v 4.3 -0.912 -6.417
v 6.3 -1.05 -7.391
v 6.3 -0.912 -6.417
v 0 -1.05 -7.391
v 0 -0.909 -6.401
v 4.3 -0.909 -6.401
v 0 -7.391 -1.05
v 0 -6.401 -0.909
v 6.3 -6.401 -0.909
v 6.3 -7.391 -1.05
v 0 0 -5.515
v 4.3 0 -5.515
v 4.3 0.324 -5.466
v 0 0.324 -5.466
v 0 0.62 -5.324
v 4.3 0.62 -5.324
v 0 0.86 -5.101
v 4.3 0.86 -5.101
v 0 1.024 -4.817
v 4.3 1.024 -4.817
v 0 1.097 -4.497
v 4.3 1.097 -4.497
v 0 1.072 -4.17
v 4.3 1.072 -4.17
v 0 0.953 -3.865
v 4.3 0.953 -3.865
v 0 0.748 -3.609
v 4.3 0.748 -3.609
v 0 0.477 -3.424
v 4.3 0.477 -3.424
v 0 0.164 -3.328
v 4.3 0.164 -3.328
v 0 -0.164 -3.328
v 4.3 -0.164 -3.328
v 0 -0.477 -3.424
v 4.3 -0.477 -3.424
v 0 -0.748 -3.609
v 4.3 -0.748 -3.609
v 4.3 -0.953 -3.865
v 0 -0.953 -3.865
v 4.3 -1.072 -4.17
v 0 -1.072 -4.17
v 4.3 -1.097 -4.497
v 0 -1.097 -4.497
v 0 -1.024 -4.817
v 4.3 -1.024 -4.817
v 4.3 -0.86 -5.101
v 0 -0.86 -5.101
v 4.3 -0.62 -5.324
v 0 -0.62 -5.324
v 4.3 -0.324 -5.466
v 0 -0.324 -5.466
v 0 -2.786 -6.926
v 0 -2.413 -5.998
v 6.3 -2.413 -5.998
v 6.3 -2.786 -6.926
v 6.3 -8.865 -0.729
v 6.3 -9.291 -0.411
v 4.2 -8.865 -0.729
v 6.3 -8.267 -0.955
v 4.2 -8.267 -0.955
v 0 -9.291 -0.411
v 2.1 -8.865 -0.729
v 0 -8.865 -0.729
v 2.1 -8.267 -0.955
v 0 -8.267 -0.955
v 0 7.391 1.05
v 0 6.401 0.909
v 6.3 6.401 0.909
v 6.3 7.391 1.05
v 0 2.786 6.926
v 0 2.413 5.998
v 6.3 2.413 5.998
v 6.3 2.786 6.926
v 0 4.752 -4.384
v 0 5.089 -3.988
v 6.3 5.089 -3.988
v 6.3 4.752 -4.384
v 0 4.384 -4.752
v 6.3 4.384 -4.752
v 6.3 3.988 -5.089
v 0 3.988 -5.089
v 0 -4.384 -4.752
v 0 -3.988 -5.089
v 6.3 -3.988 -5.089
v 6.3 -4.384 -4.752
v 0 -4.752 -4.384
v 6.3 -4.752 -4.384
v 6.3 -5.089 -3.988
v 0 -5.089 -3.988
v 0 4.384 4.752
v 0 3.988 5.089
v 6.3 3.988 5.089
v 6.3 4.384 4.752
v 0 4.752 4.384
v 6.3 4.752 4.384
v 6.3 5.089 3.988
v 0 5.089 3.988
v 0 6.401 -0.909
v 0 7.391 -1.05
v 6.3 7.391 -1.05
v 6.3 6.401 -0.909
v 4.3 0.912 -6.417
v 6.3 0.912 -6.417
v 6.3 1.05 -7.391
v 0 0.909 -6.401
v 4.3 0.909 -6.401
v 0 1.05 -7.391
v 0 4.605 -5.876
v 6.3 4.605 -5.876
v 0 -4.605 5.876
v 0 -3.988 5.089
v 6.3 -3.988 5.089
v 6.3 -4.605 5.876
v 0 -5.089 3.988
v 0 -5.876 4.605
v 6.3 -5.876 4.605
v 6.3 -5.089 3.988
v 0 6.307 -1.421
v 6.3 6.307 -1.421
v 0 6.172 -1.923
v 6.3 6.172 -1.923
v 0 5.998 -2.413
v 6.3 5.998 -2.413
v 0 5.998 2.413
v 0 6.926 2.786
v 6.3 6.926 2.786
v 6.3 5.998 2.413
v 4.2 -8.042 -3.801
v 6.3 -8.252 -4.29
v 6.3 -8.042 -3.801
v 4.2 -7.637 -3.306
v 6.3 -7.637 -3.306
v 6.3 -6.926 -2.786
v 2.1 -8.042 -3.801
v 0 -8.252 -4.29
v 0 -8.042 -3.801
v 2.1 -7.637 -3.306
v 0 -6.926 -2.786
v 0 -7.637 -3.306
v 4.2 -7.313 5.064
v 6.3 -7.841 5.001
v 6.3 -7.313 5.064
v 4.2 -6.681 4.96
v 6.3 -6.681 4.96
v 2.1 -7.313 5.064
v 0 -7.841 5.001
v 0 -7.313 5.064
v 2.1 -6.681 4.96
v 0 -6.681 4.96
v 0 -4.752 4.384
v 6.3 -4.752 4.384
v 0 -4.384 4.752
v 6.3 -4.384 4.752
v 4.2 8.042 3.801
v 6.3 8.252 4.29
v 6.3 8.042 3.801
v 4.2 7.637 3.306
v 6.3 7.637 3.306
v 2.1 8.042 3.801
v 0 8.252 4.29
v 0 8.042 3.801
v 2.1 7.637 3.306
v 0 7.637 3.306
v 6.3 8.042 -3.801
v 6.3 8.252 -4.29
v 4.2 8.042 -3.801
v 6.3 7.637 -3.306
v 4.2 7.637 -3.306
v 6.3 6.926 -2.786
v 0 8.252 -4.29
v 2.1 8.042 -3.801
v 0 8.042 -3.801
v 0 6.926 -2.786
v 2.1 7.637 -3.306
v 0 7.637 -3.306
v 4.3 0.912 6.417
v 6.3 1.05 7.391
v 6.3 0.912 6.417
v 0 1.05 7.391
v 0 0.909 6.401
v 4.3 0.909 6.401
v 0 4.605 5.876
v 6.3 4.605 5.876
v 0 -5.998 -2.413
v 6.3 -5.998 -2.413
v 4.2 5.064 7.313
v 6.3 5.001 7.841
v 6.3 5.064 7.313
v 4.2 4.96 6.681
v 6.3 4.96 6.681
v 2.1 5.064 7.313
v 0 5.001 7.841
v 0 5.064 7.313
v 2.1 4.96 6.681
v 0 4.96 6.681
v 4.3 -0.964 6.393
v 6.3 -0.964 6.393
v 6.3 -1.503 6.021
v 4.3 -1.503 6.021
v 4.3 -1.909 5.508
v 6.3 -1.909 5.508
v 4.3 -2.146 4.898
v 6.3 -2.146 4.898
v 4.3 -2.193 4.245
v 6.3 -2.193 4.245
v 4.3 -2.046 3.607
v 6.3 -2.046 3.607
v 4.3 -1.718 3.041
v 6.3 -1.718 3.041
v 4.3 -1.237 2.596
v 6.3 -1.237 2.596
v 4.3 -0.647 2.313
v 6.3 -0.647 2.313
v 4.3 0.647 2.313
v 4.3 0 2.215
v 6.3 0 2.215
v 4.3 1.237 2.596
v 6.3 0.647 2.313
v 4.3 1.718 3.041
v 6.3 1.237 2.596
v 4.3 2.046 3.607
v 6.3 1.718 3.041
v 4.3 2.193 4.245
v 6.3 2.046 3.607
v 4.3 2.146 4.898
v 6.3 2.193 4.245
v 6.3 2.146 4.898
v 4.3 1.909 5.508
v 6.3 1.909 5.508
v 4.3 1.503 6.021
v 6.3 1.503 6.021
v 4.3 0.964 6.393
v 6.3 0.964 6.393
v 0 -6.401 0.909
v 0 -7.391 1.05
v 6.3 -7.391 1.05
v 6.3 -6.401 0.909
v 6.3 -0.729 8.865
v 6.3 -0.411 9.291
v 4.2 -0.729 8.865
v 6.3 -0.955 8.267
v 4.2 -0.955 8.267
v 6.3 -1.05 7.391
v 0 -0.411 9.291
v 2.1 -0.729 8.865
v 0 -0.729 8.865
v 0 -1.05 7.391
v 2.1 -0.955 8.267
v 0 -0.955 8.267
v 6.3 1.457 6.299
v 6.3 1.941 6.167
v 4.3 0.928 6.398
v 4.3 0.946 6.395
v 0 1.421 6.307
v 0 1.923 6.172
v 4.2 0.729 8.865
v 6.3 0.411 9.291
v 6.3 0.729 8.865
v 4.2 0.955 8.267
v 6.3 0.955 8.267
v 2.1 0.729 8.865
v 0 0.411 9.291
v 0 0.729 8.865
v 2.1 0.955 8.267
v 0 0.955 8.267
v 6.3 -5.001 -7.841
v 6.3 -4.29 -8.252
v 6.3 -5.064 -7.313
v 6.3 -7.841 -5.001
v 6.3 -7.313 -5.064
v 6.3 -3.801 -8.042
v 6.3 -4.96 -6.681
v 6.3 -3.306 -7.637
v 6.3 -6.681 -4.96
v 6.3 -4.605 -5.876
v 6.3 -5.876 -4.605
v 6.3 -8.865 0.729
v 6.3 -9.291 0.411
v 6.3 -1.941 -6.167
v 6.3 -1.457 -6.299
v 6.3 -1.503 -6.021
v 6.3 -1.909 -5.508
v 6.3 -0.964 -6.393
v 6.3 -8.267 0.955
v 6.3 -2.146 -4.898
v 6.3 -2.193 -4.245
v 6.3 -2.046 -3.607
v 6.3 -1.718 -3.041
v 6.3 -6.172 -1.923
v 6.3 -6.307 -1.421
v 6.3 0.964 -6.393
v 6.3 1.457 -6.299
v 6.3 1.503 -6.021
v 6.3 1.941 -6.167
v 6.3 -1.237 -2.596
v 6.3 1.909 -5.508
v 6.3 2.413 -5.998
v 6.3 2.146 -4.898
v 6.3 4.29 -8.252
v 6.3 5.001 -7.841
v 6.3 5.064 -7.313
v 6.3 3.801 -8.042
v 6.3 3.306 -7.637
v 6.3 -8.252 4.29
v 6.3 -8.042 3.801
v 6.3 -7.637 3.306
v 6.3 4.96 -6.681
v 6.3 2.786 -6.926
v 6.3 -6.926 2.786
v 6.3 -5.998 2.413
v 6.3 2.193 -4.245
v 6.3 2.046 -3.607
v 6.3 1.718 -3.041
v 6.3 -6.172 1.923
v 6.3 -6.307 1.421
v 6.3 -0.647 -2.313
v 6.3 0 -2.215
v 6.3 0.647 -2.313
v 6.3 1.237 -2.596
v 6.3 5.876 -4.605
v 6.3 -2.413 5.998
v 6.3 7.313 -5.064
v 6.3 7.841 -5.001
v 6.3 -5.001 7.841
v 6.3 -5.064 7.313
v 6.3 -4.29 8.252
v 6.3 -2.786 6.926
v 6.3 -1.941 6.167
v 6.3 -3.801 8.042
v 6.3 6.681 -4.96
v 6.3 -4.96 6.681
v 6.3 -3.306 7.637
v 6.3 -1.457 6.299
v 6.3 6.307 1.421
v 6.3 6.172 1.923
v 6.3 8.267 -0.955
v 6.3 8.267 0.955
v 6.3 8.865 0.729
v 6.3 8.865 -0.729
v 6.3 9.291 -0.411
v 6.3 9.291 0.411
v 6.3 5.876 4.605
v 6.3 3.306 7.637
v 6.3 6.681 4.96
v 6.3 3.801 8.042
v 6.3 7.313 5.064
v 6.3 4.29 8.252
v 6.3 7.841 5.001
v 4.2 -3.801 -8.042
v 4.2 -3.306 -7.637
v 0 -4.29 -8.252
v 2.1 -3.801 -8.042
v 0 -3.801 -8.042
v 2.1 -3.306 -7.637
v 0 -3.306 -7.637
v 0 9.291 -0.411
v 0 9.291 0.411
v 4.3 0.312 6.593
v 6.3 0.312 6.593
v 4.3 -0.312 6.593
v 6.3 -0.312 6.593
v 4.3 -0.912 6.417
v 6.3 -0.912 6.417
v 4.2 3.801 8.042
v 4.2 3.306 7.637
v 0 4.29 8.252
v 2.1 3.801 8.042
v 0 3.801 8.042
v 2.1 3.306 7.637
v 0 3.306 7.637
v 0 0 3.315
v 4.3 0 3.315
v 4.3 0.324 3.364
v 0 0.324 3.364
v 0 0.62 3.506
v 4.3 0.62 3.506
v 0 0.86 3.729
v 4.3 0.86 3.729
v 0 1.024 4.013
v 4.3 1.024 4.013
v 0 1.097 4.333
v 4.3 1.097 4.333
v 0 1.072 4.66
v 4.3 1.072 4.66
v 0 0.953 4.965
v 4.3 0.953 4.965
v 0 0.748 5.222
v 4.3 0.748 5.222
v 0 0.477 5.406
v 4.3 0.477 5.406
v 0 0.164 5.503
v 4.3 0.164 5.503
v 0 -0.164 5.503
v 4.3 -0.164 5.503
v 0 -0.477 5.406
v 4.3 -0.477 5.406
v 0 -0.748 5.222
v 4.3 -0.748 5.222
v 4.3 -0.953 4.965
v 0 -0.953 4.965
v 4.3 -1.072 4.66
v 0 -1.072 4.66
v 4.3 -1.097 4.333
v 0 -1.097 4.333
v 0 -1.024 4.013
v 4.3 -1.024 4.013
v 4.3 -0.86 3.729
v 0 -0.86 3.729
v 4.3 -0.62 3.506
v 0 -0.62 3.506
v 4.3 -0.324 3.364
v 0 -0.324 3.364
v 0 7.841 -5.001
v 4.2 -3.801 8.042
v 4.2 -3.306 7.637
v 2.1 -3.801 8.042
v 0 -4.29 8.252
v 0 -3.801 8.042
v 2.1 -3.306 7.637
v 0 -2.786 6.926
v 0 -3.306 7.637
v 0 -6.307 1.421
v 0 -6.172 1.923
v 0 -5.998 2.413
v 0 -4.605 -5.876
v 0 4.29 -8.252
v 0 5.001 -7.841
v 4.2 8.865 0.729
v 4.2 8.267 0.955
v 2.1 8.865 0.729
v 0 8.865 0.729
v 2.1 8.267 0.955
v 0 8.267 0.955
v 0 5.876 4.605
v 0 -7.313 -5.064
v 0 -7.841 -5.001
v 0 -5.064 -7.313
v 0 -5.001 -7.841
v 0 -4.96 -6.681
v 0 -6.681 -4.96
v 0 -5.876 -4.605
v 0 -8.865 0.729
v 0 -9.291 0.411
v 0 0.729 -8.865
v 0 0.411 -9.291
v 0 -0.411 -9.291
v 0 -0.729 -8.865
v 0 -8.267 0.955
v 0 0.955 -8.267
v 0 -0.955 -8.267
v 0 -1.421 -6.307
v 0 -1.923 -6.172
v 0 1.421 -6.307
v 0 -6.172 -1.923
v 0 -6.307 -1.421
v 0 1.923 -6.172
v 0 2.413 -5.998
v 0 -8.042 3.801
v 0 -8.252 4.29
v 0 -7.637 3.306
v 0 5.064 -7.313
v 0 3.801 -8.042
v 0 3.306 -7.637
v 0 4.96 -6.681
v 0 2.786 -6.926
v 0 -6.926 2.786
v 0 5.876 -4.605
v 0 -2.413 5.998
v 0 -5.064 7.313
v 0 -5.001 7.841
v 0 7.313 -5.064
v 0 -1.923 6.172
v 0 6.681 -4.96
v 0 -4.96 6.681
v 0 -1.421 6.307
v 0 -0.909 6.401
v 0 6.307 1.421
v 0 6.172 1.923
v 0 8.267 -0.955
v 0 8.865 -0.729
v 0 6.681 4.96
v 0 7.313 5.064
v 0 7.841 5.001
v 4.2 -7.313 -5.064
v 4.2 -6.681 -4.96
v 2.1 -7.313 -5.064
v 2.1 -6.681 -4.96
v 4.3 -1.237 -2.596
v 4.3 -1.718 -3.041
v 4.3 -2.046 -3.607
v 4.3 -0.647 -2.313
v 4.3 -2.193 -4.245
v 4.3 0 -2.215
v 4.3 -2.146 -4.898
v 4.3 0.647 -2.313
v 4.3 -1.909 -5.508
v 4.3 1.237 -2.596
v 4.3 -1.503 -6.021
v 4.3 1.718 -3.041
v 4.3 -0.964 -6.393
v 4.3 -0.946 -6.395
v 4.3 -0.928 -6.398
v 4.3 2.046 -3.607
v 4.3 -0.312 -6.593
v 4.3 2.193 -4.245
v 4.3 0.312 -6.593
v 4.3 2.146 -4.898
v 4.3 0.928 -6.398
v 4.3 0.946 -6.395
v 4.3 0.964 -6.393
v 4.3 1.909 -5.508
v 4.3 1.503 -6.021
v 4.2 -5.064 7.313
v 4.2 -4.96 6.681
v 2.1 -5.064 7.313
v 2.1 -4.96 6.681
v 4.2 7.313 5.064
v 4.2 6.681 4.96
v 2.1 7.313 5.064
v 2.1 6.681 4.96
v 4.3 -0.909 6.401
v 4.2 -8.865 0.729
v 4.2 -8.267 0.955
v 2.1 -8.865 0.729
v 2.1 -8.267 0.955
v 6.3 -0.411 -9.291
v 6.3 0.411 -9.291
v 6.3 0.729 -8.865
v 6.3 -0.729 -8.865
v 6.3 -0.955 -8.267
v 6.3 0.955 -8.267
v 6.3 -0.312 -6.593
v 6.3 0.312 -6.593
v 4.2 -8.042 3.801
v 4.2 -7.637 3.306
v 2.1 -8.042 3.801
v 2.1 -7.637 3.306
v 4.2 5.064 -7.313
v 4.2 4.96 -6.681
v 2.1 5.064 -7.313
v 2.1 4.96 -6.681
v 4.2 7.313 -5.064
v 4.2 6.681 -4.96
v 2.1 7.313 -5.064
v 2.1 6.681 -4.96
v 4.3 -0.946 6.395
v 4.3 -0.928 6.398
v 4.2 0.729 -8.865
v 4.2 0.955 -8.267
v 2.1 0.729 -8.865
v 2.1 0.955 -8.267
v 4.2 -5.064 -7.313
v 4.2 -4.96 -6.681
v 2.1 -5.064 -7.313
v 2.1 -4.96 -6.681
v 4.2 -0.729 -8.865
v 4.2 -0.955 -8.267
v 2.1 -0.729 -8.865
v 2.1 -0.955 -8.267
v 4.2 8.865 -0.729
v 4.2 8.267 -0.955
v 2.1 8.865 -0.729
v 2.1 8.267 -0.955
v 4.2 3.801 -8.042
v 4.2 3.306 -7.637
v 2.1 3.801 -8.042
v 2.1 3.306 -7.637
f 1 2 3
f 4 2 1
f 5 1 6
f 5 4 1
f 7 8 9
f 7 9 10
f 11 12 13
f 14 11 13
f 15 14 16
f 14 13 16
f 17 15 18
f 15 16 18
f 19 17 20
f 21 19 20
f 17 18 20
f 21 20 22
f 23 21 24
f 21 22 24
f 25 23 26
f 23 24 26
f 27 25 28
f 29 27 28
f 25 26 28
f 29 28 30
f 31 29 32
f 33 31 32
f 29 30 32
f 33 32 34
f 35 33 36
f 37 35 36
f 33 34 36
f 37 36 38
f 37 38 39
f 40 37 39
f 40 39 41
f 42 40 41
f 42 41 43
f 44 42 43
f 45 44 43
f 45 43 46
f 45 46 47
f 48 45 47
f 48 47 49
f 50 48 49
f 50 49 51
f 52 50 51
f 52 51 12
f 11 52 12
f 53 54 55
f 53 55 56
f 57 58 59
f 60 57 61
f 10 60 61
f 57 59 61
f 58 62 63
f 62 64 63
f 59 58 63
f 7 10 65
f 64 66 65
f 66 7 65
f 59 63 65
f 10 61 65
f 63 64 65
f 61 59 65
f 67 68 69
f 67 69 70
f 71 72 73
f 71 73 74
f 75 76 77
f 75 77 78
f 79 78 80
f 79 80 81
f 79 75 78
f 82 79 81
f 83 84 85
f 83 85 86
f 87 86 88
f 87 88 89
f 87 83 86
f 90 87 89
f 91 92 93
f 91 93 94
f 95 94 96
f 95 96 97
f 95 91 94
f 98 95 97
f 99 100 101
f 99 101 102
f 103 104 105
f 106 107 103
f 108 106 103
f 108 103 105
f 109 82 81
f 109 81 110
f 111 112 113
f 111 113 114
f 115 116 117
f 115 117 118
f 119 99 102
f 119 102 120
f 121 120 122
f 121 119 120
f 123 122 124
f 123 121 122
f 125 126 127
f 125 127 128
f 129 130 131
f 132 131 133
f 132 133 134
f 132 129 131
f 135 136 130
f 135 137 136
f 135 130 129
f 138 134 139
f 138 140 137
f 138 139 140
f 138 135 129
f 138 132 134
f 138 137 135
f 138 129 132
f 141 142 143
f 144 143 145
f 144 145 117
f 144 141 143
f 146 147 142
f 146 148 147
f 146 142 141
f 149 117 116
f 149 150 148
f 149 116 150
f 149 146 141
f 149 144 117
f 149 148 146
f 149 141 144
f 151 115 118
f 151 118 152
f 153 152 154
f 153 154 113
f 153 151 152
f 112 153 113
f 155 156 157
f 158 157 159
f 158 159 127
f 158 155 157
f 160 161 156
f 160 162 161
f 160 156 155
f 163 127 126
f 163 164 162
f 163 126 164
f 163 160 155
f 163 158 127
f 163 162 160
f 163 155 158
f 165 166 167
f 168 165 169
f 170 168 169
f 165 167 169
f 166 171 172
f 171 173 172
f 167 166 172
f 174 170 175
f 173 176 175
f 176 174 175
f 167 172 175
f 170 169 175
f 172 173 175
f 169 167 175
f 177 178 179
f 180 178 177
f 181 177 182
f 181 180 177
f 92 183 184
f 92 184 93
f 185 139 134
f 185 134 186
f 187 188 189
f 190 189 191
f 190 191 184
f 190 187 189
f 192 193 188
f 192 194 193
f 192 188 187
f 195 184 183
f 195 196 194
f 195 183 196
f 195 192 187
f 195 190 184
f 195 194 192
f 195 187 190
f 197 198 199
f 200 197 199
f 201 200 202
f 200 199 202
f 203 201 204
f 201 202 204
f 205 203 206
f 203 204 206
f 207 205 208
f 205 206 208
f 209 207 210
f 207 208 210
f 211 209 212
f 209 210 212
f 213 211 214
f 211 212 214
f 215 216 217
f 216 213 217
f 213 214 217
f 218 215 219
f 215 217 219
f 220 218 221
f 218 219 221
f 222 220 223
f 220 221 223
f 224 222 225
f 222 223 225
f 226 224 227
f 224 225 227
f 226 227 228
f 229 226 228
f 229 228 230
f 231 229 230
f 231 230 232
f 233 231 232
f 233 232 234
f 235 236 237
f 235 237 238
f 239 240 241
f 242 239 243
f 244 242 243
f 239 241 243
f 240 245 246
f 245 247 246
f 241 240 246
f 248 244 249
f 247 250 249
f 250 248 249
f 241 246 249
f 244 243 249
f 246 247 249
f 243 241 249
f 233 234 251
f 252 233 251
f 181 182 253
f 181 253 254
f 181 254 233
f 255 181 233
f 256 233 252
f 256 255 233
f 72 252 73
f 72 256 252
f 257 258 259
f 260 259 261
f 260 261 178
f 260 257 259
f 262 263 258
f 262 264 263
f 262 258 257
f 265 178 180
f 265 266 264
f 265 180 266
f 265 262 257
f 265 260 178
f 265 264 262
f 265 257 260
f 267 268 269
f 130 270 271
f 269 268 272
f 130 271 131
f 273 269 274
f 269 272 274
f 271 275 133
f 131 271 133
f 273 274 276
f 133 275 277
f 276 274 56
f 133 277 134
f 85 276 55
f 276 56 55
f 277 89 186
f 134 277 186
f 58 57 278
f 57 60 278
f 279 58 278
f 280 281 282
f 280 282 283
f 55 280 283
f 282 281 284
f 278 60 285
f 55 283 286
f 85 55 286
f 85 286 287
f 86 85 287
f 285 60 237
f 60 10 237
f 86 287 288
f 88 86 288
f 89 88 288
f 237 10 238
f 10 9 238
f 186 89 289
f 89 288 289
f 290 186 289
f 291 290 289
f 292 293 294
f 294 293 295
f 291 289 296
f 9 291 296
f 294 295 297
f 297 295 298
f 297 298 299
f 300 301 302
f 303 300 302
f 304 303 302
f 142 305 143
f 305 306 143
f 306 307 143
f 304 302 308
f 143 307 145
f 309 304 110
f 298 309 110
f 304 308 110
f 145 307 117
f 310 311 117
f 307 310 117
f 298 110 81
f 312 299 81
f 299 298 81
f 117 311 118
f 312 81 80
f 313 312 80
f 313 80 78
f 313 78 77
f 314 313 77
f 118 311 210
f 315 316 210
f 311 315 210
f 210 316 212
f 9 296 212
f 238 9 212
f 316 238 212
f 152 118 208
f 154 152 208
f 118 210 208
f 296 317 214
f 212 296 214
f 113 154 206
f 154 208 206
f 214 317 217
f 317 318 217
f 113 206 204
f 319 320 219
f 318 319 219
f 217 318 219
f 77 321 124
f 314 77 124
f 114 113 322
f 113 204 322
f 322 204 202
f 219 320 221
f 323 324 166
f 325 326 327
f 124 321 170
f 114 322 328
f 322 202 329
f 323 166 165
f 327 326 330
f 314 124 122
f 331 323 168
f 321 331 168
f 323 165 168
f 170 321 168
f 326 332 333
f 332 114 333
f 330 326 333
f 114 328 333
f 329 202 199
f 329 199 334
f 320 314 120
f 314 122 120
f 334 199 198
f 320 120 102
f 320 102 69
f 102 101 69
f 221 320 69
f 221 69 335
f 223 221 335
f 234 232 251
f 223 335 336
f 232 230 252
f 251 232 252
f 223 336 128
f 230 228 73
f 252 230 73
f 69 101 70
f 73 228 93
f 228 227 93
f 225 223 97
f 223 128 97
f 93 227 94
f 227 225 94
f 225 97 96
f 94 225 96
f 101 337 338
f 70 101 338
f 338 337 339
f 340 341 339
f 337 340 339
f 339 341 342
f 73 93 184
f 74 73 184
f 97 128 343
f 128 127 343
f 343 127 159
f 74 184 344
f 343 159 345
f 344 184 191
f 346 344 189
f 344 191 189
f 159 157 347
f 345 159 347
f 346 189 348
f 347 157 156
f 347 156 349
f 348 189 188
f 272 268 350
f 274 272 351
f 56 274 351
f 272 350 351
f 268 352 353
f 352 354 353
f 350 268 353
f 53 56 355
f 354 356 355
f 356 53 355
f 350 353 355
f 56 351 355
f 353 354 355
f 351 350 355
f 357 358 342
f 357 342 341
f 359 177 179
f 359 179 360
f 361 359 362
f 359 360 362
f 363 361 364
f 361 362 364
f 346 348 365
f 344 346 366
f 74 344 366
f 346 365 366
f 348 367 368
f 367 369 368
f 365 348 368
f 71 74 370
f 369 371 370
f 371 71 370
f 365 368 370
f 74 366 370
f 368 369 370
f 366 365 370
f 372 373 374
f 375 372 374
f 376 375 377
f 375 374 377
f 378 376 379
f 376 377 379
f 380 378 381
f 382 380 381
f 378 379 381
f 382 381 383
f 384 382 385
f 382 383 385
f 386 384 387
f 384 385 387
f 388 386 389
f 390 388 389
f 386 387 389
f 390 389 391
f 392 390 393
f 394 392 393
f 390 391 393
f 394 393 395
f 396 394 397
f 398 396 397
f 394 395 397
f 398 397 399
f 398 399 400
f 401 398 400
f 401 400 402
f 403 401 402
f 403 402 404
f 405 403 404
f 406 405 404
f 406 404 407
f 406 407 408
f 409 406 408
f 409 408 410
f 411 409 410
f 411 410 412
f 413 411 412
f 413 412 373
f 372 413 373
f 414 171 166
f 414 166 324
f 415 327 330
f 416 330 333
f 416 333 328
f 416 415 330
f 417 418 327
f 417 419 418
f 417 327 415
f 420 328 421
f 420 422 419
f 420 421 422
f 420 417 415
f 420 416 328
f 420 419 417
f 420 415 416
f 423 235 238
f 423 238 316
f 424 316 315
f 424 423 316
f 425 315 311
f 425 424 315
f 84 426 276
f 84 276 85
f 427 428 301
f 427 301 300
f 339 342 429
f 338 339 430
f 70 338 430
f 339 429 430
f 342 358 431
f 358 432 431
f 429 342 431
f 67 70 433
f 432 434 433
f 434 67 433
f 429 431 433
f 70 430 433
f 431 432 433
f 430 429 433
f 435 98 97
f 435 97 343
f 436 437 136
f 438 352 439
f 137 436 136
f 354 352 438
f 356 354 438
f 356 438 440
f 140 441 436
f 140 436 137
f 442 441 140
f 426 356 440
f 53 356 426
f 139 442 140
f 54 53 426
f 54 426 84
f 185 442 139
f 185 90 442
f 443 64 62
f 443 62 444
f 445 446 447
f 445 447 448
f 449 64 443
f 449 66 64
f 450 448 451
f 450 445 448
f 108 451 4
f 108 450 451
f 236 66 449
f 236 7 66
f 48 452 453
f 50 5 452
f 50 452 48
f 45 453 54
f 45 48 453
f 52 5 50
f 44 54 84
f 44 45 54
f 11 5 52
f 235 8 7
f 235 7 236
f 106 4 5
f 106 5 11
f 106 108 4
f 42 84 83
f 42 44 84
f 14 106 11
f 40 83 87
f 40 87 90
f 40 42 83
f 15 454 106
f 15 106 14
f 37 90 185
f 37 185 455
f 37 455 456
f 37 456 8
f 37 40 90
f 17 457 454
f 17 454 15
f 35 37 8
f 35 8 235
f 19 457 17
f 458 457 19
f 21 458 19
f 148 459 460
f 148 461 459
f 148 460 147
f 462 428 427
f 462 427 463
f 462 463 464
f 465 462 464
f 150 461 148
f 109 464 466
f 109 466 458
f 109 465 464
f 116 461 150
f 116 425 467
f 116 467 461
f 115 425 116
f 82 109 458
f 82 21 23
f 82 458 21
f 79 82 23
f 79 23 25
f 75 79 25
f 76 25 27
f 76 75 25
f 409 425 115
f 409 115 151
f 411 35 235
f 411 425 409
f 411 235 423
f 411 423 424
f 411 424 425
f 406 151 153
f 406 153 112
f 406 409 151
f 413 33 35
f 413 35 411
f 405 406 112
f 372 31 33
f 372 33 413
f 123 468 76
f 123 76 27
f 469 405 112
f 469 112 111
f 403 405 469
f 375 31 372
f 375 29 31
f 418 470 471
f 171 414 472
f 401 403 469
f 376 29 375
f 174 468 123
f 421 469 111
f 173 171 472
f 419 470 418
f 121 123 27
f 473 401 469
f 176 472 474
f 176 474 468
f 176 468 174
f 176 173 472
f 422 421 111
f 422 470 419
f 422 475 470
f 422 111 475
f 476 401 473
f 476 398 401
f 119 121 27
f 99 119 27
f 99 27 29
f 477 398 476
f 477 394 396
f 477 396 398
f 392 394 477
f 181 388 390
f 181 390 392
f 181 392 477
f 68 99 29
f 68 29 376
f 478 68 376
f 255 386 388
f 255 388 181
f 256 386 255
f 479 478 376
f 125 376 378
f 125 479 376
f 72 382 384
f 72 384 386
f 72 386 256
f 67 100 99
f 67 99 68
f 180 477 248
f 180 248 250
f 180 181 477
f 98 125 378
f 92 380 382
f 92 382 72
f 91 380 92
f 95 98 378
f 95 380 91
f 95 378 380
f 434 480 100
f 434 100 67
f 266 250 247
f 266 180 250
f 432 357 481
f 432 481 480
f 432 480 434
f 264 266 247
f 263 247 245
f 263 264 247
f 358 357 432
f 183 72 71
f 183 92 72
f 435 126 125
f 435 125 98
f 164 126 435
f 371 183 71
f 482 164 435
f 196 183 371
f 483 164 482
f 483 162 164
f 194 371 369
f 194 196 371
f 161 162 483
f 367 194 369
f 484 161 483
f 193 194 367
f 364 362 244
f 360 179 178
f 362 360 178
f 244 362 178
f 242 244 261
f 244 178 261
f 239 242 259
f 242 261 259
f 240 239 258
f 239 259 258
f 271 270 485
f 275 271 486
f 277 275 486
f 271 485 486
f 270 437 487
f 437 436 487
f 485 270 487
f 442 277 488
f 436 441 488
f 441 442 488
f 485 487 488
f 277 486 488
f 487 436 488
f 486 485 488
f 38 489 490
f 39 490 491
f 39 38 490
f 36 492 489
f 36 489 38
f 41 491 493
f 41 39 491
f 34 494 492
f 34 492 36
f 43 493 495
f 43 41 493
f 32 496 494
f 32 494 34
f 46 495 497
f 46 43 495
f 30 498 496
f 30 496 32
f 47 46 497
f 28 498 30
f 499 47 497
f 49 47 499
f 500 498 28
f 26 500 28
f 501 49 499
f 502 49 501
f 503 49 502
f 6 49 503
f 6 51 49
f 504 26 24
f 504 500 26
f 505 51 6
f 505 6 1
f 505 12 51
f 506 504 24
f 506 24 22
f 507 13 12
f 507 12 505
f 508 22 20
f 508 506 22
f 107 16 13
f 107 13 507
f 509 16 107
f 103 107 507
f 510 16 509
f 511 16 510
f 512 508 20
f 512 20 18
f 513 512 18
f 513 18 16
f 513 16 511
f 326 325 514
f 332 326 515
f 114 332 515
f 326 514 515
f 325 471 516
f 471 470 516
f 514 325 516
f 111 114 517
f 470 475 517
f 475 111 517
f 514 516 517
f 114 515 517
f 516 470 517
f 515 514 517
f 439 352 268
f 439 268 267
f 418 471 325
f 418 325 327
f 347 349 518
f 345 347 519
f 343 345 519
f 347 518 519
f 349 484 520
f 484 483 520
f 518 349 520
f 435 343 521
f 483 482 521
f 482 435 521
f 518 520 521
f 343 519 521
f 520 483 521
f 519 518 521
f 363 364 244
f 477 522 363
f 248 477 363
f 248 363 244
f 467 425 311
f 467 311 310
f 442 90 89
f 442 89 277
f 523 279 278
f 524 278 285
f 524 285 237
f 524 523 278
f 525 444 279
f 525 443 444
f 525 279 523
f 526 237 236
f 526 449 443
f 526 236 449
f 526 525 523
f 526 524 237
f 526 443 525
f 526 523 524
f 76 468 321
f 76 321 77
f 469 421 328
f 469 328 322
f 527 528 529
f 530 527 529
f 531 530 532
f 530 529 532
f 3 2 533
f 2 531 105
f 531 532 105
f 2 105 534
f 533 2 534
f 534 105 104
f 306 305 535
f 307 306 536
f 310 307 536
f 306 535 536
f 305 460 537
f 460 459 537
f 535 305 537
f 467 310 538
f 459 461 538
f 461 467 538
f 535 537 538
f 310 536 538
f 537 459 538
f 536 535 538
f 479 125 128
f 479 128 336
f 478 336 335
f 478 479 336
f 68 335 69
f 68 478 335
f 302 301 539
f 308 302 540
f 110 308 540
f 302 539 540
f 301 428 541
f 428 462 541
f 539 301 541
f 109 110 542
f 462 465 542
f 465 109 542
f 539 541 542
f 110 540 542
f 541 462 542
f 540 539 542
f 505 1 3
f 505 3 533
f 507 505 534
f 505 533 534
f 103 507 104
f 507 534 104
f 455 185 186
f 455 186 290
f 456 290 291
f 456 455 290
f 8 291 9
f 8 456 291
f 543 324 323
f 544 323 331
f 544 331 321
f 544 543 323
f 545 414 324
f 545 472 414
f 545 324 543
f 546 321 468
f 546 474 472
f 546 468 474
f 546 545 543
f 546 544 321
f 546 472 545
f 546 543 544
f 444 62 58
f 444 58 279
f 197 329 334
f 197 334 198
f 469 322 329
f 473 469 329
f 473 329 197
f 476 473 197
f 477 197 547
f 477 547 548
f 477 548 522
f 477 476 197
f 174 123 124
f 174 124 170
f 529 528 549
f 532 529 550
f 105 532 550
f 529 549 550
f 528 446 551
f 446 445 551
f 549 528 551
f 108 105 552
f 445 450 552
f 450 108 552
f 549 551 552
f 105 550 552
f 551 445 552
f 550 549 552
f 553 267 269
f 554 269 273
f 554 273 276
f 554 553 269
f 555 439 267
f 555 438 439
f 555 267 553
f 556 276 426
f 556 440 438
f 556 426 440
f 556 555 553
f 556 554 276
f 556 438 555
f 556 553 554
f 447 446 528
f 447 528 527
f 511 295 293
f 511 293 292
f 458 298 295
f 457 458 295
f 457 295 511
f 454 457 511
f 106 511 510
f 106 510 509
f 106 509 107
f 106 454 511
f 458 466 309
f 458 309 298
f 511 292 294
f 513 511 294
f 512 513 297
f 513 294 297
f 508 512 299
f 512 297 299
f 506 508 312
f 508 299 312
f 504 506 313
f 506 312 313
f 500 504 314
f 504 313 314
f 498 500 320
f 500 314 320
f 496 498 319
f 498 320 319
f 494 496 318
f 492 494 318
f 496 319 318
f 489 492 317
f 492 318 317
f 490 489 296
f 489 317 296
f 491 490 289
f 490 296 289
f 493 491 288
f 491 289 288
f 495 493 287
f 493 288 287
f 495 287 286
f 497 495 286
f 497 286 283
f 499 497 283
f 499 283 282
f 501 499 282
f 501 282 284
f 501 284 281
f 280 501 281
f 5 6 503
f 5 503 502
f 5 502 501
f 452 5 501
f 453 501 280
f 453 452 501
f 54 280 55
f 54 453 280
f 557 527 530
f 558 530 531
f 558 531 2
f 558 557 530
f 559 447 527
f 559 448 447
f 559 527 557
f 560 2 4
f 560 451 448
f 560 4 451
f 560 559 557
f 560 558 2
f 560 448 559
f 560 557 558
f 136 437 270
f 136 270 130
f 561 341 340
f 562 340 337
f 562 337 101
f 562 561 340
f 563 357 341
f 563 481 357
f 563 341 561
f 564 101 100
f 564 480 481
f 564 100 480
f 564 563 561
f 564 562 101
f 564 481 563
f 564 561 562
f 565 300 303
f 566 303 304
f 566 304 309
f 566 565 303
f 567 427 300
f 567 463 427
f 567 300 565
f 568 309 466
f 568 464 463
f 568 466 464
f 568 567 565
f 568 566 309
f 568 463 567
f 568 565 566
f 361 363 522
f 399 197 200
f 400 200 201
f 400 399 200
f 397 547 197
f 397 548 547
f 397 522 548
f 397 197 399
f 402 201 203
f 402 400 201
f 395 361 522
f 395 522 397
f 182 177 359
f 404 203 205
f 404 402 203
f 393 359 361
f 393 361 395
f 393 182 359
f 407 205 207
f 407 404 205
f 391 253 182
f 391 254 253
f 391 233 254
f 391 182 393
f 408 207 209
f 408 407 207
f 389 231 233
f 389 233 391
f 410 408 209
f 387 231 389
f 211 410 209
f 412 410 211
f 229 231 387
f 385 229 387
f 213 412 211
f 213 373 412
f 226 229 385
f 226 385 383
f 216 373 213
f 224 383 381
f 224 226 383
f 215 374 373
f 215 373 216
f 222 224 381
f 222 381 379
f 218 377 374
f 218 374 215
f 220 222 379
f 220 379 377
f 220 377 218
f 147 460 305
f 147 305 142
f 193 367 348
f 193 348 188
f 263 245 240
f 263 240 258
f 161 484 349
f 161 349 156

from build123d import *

# Parameters (mm, degrees)
BOSS_EXTRUDE1_DEPTH = 6.3
SKETCH2_R           = 1.1
CUT_EXTRUDE1_DEPTH  = 7.3000001
SKETCH3_R           = 2.2
CUT_EXTRUDE2_DEPTH  = 2


with BuildPart() as part:
    # Sketch1 → Boss-Extrude1 (new body)
    with BuildSketch(Plane(origin=(0, 0, 0), x_dir=(0, 0, -1), z_dir=(1, 0, 0))):
        with BuildLine():
            Line((-0.909343603, 6.400728022), (-1.05, 7.390786494))
            add(Edge.make_bspline(
                [(-0.410905417, 9.290786494), (-0.761226832, 8.915917898), (-1.03420339, 8.440297341), (-1.05, 7.390786494)],
                knots=[0, 0, 0, 0, 1, 1, 1, 1], degree=3))
            Line((-0.410905417, 9.290786494), (0.410905417, 9.290786494))
            add(Edge.make_bspline(
                [(0.410905417, 9.290786494), (0.761226832, 8.915917898), (1.03420339, 8.440297341), (1.05, 7.390786494)],
                knots=[0, 0, 0, 0, 1, 1, 1, 1], degree=3))
            Line((1.05, 7.390786494), (0.909343603, 6.400728022))
            ThreePointArc((0.909343603, 6.400728022), (1.673265127, 6.244710467), (2.41284935, 5.997864871))
            Line((2.41284935, 5.997864871), (2.786066573, 6.925608858))
            add(Edge.make_bspline(
                [(4.289538717, 8.251509833), (3.798717175, 8.102024814), (3.324502262, 7.826613608), (2.786066573, 6.925608858)],
                knots=[0, 0, 0, 0, 1, 1, 1, 1], degree=3))
            Line((4.289538717, 8.251509833), (5.001247777, 7.840604417))
            add(Edge.make_bspline(
                [(5.001247777, 7.840604417), (5.117200723, 7.340797982), (5.115795079, 6.792410217), (4.604719921, 5.875608858)],
                knots=[0, 0, 0, 0, 1, 1, 1, 1], degree=3))
            Line((4.604719921, 5.875608858), (3.987878672, 5.088521268))
            ThreePointArc((3.987878672, 5.088521268), (4.57144534, 4.57144534), (5.088521268, 3.987878672))
            Line((5.088521268, 3.987878672), (5.875608858, 4.604719921))
            add(Edge.make_bspline(
                [(7.840604417, 5.001247777), (7.340797982, 5.117200723), (6.792410217, 5.115795079), (5.875608858, 4.604719921)],
                knots=[0, 0, 0, 0, 1, 1, 1, 1], degree=3))
            Line((7.840604417, 5.001247777), (8.251509833, 4.289538717))
            add(Edge.make_bspline(
                [(8.251509833, 4.289538717), (8.102024814, 3.798717175), (7.826613608, 3.324502262), (6.925608858, 2.786066573)],
                knots=[0, 0, 0, 0, 1, 1, 1, 1], degree=3))
            Line((6.925608858, 2.786066573), (5.997864871, 2.41284935))
            ThreePointArc((5.997864871, 2.41284935), (6.244710467, 1.673265127), (6.400728022, 0.909343603))
            Line((6.400728022, 0.909343603), (7.390786494, 1.05))
            add(Edge.make_bspline(
                [(9.290786494, 0.410905417), (8.915917898, 0.761226832), (8.440297341, 1.03420339), (7.390786494, 1.05)],
                knots=[0, 0, 0, 0, 1, 1, 1, 1], degree=3))
            Line((9.290786494, 0.410905417), (9.290786494, -0.410905417))
            add(Edge.make_bspline(
                [(9.290786494, -0.410905417), (8.915917898, -0.761226832), (8.440297341, -1.03420339), (7.390786494, -1.05)],
                knots=[0, 0, 0, 0, 1, 1, 1, 1], degree=3))
            Line((7.390786494, -1.05), (6.400728022, -0.909343603))
            ThreePointArc((6.400728022, -0.909343603), (6.244710467, -1.673265127), (5.997864871, -2.41284935))
            Line((5.997864871, -2.41284935), (6.925608858, -2.786066573))
            add(Edge.make_bspline(
                [(8.251509833, -4.289538717), (8.102024814, -3.798717175), (7.826613608, -3.324502262), (6.925608858, -2.786066573)],
                knots=[0, 0, 0, 0, 1, 1, 1, 1], degree=3))
            Line((8.251509833, -4.289538717), (7.840604417, -5.001247777))
            add(Edge.make_bspline(
                [(7.840604417, -5.001247777), (7.340797982, -5.117200723), (6.792410217, -5.115795079), (5.875608858, -4.604719921)],
                knots=[0, 0, 0, 0, 1, 1, 1, 1], degree=3))
            Line((5.875608858, -4.604719921), (5.088521268, -3.987878672))
            ThreePointArc((5.088521268, -3.987878672), (4.57144534, -4.57144534), (3.987878672, -5.088521268))
            Line((3.987878672, -5.088521268), (4.604719921, -5.875608858))
            add(Edge.make_bspline(
                [(5.001247777, -7.840604417), (5.117200723, -7.340797982), (5.115795079, -6.792410217), (4.604719921, -5.875608858)],
                knots=[0, 0, 0, 0, 1, 1, 1, 1], degree=3))
            Line((5.001247777, -7.840604417), (4.289538717, -8.251509833))
            add(Edge.make_bspline(
                [(4.289538717, -8.251509833), (3.798717175, -8.102024814), (3.324502262, -7.826613608), (2.786066573, -6.925608858)],
                knots=[0, 0, 0, 0, 1, 1, 1, 1], degree=3))
            Line((2.786066573, -6.925608858), (2.41284935, -5.997864871))
            ThreePointArc((2.41284935, -5.997864871), (1.673265127, -6.244710467), (0.909343603, -6.400728022))
            Line((0.909343603, -6.400728022), (1.05, -7.390786494))
            add(Edge.make_bspline(
                [(0.410905417, -9.290786494), (0.761226832, -8.915917898), (1.03420339, -8.440297341), (1.05, -7.390786494)],
                knots=[0, 0, 0, 0, 1, 1, 1, 1], degree=3))
            Line((0.410905417, -9.290786494), (-0.410905417, -9.290786494))
            add(Edge.make_bspline(
                [(-0.410905417, -9.290786494), (-0.761226832, -8.915917898), (-1.03420339, -8.440297341), (-1.05, -7.390786494)],
                knots=[0, 0, 0, 0, 1, 1, 1, 1], degree=3))
            Line((-1.05, -7.390786494), (-0.909343603, -6.400728022))
            ThreePointArc((-0.909343603, -6.400728022), (-1.673265127, -6.244710467), (-2.41284935, -5.997864871))
            Line((-2.41284935, -5.997864871), (-2.786066573, -6.925608858))
            add(Edge.make_bspline(
                [(-4.289538717, -8.251509833), (-3.798717175, -8.102024814), (-3.324502262, -7.826613608), (-2.786066573, -6.925608858)],
                knots=[0, 0, 0, 0, 1, 1, 1, 1], degree=3))
            Line((-4.289538717, -8.251509833), (-5.001247777, -7.840604417))
            add(Edge.make_bspline(
                [(-5.001247777, -7.840604417), (-5.117200723, -7.340797982), (-5.115795079, -6.792410217), (-4.604719921, -5.875608858)],
                knots=[0, 0, 0, 0, 1, 1, 1, 1], degree=3))
            Line((-4.604719921, -5.875608858), (-3.987878672, -5.088521268))
            ThreePointArc((-3.987878672, -5.088521268), (-4.57144534, -4.57144534), (-5.088521268, -3.987878672))
            Line((-5.088521268, -3.987878672), (-5.875608858, -4.604719921))
            add(Edge.make_bspline(
                [(-7.840604417, -5.001247777), (-7.340797982, -5.117200723), (-6.792410217, -5.115795079), (-5.875608858, -4.604719921)],
                knots=[0, 0, 0, 0, 1, 1, 1, 1], degree=3))
            Line((-7.840604417, -5.001247777), (-8.251509833, -4.289538717))
            add(Edge.make_bspline(
                [(-8.251509833, -4.289538717), (-8.102024814, -3.798717175), (-7.826613608, -3.324502262), (-6.925608858, -2.786066573)],
                knots=[0, 0, 0, 0, 1, 1, 1, 1], degree=3))
            Line((-6.925608858, -2.786066573), (-5.997864871, -2.41284935))
            ThreePointArc((-5.997864871, -2.41284935), (-6.244710467, -1.673265127), (-6.400728022, -0.909343603))
            Line((-6.400728022, -0.909343603), (-7.390786494, -1.05))
            add(Edge.make_bspline(
                [(-9.290786494, -0.410905417), (-8.915917898, -0.761226832), (-8.440297341, -1.03420339), (-7.390786494, -1.05)],
                knots=[0, 0, 0, 0, 1, 1, 1, 1], degree=3))
            Line((-9.290786494, -0.410905417), (-9.290786494, 0.410905417))
            add(Edge.make_bspline(
                [(-9.290786494, 0.410905417), (-8.915917898, 0.761226832), (-8.440297341, 1.03420339), (-7.390786494, 1.05)],
                knots=[0, 0, 0, 0, 1, 1, 1, 1], degree=3))
            Line((-7.390786494, 1.05), (-6.400728022, 0.909343603))
            ThreePointArc((-6.400728022, 0.909343603), (-6.244710467, 1.673265127), (-5.997864871, 2.41284935))
            Line((-5.997864871, 2.41284935), (-6.925608858, 2.786066573))
            add(Edge.make_bspline(
                [(-8.251509833, 4.289538717), (-8.102024814, 3.798717175), (-7.826613608, 3.324502262), (-6.925608858, 2.786066573)],
                knots=[0, 0, 0, 0, 1, 1, 1, 1], degree=3))
            Line((-8.251509833, 4.289538717), (-7.840604417, 5.001247777))
            add(Edge.make_bspline(
                [(-7.840604417, 5.001247777), (-7.340797982, 5.117200723), (-6.792410217, 5.115795079), (-5.875608858, 4.604719921)],
                knots=[0, 0, 0, 0, 1, 1, 1, 1], degree=3))
            Line((-5.875608858, 4.604719921), (-5.088521268, 3.987878672))
            ThreePointArc((-5.088521268, 3.987878672), (-4.57144534, 4.57144534), (-3.987878672, 5.088521268))
            Line((-3.987878672, 5.088521268), (-4.604719921, 5.875608858))
            add(Edge.make_bspline(
                [(-5.001247777, 7.840604417), (-5.117200723, 7.340797982), (-5.115795079, 6.792410217), (-4.604719921, 5.875608858)],
                knots=[0, 0, 0, 0, 1, 1, 1, 1], degree=3))
            Line((-5.001247777, 7.840604417), (-4.289538717, 8.251509833))
            add(Edge.make_bspline(
                [(-4.289538717, 8.251509833), (-3.798717175, 8.102024814), (-3.324502262, 7.826613608), (-2.786066573, 6.925608858)],
                knots=[0, 0, 0, 0, 1, 1, 1, 1], degree=3))
            Line((-2.786066573, 6.925608858), (-2.41284935, 5.997864871))
            ThreePointArc((-2.41284935, 5.997864871), (-1.673265127, 6.244710467), (-0.909343603, 6.400728022))
        make_face()
    extrude(amount=BOSS_EXTRUDE1_DEPTH)

    # Sketch2 → Cut-Extrude1 (cut, through all)
    with BuildSketch(Plane(origin=(6.3, 0, 0), x_dir=(0, 0, -1), z_dir=(1, 0, 0))):
        with Locations((4.415267157, 0)):
            Circle(SKETCH2_R)
        with Locations((-4.415267157, 0)):
            Circle(SKETCH2_R)
    extrude(amount=-CUT_EXTRUDE1_DEPTH, mode=Mode.SUBTRACT)

    # Sketch3 → Cut-Extrude2 (cut)
    with BuildSketch(Plane(origin=(6.3, 0, 0), x_dir=(0, 0, -1), z_dir=(1, 0, 0))):
        with Locations((-4.415267157, 0)):
            Circle(SKETCH3_R)
        with Locations((4.415267157, 0)):
            Circle(SKETCH3_R)
    extrude(amount=-CUT_EXTRUDE2_DEPTH, mode=Mode.SUBTRACT)


solid = part.part
